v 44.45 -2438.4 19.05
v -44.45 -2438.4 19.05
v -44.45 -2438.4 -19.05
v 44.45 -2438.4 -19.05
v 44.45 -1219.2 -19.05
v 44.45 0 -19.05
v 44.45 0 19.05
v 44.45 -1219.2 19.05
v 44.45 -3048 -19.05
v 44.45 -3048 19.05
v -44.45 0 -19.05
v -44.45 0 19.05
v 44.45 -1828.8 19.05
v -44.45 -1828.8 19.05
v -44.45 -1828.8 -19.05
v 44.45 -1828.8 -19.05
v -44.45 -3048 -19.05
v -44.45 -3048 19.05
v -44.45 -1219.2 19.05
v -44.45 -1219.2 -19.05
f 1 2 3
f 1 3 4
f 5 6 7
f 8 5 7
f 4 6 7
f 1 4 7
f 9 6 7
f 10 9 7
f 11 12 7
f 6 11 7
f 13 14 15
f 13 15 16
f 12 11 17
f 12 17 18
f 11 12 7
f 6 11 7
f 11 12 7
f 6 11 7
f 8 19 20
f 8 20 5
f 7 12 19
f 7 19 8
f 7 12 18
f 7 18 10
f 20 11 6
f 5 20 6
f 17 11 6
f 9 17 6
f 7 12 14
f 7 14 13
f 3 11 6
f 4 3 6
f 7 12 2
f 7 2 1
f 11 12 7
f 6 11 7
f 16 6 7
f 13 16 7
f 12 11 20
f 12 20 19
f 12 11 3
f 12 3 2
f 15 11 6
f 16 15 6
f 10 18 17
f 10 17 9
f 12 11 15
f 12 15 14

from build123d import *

# Parameters (mm, degrees)
F0_W     = 88.9
F0_H     = 38.1
F1_DEPTH = 2438.4
F2_DEPTH = 3048
F3_DEPTH = 1828.8
F4_DEPTH = 1219.2


with BuildPart() as f1:
    # F0 (on Front) → F1 (new body)
    with BuildSketch(Plane.XZ):
        Rectangle(F0_W, F0_H)
    extrude(amount=F1_DEPTH)


with BuildPart() as f2:
    # F0 (on Front) → F2 (new body)
    with BuildSketch(Plane.XZ):
        Rectangle(F0_W, F0_H)
    extrude(amount=F2_DEPTH)


with BuildPart() as f3:
    # F0 (on Front) → F3 (new body)
    with BuildSketch(Plane.XZ):
        Rectangle(F0_W, F0_H)
    extrude(amount=F3_DEPTH)


with BuildPart() as f4:
    # F0 (on Front) → F4 (new body)
    with BuildSketch(Plane.XZ):
        Rectangle(F0_W, F0_H)
    extrude(amount=F4_DEPTH)


solid = Compound([f1.part, f2.part, f3.part, f4.part])
